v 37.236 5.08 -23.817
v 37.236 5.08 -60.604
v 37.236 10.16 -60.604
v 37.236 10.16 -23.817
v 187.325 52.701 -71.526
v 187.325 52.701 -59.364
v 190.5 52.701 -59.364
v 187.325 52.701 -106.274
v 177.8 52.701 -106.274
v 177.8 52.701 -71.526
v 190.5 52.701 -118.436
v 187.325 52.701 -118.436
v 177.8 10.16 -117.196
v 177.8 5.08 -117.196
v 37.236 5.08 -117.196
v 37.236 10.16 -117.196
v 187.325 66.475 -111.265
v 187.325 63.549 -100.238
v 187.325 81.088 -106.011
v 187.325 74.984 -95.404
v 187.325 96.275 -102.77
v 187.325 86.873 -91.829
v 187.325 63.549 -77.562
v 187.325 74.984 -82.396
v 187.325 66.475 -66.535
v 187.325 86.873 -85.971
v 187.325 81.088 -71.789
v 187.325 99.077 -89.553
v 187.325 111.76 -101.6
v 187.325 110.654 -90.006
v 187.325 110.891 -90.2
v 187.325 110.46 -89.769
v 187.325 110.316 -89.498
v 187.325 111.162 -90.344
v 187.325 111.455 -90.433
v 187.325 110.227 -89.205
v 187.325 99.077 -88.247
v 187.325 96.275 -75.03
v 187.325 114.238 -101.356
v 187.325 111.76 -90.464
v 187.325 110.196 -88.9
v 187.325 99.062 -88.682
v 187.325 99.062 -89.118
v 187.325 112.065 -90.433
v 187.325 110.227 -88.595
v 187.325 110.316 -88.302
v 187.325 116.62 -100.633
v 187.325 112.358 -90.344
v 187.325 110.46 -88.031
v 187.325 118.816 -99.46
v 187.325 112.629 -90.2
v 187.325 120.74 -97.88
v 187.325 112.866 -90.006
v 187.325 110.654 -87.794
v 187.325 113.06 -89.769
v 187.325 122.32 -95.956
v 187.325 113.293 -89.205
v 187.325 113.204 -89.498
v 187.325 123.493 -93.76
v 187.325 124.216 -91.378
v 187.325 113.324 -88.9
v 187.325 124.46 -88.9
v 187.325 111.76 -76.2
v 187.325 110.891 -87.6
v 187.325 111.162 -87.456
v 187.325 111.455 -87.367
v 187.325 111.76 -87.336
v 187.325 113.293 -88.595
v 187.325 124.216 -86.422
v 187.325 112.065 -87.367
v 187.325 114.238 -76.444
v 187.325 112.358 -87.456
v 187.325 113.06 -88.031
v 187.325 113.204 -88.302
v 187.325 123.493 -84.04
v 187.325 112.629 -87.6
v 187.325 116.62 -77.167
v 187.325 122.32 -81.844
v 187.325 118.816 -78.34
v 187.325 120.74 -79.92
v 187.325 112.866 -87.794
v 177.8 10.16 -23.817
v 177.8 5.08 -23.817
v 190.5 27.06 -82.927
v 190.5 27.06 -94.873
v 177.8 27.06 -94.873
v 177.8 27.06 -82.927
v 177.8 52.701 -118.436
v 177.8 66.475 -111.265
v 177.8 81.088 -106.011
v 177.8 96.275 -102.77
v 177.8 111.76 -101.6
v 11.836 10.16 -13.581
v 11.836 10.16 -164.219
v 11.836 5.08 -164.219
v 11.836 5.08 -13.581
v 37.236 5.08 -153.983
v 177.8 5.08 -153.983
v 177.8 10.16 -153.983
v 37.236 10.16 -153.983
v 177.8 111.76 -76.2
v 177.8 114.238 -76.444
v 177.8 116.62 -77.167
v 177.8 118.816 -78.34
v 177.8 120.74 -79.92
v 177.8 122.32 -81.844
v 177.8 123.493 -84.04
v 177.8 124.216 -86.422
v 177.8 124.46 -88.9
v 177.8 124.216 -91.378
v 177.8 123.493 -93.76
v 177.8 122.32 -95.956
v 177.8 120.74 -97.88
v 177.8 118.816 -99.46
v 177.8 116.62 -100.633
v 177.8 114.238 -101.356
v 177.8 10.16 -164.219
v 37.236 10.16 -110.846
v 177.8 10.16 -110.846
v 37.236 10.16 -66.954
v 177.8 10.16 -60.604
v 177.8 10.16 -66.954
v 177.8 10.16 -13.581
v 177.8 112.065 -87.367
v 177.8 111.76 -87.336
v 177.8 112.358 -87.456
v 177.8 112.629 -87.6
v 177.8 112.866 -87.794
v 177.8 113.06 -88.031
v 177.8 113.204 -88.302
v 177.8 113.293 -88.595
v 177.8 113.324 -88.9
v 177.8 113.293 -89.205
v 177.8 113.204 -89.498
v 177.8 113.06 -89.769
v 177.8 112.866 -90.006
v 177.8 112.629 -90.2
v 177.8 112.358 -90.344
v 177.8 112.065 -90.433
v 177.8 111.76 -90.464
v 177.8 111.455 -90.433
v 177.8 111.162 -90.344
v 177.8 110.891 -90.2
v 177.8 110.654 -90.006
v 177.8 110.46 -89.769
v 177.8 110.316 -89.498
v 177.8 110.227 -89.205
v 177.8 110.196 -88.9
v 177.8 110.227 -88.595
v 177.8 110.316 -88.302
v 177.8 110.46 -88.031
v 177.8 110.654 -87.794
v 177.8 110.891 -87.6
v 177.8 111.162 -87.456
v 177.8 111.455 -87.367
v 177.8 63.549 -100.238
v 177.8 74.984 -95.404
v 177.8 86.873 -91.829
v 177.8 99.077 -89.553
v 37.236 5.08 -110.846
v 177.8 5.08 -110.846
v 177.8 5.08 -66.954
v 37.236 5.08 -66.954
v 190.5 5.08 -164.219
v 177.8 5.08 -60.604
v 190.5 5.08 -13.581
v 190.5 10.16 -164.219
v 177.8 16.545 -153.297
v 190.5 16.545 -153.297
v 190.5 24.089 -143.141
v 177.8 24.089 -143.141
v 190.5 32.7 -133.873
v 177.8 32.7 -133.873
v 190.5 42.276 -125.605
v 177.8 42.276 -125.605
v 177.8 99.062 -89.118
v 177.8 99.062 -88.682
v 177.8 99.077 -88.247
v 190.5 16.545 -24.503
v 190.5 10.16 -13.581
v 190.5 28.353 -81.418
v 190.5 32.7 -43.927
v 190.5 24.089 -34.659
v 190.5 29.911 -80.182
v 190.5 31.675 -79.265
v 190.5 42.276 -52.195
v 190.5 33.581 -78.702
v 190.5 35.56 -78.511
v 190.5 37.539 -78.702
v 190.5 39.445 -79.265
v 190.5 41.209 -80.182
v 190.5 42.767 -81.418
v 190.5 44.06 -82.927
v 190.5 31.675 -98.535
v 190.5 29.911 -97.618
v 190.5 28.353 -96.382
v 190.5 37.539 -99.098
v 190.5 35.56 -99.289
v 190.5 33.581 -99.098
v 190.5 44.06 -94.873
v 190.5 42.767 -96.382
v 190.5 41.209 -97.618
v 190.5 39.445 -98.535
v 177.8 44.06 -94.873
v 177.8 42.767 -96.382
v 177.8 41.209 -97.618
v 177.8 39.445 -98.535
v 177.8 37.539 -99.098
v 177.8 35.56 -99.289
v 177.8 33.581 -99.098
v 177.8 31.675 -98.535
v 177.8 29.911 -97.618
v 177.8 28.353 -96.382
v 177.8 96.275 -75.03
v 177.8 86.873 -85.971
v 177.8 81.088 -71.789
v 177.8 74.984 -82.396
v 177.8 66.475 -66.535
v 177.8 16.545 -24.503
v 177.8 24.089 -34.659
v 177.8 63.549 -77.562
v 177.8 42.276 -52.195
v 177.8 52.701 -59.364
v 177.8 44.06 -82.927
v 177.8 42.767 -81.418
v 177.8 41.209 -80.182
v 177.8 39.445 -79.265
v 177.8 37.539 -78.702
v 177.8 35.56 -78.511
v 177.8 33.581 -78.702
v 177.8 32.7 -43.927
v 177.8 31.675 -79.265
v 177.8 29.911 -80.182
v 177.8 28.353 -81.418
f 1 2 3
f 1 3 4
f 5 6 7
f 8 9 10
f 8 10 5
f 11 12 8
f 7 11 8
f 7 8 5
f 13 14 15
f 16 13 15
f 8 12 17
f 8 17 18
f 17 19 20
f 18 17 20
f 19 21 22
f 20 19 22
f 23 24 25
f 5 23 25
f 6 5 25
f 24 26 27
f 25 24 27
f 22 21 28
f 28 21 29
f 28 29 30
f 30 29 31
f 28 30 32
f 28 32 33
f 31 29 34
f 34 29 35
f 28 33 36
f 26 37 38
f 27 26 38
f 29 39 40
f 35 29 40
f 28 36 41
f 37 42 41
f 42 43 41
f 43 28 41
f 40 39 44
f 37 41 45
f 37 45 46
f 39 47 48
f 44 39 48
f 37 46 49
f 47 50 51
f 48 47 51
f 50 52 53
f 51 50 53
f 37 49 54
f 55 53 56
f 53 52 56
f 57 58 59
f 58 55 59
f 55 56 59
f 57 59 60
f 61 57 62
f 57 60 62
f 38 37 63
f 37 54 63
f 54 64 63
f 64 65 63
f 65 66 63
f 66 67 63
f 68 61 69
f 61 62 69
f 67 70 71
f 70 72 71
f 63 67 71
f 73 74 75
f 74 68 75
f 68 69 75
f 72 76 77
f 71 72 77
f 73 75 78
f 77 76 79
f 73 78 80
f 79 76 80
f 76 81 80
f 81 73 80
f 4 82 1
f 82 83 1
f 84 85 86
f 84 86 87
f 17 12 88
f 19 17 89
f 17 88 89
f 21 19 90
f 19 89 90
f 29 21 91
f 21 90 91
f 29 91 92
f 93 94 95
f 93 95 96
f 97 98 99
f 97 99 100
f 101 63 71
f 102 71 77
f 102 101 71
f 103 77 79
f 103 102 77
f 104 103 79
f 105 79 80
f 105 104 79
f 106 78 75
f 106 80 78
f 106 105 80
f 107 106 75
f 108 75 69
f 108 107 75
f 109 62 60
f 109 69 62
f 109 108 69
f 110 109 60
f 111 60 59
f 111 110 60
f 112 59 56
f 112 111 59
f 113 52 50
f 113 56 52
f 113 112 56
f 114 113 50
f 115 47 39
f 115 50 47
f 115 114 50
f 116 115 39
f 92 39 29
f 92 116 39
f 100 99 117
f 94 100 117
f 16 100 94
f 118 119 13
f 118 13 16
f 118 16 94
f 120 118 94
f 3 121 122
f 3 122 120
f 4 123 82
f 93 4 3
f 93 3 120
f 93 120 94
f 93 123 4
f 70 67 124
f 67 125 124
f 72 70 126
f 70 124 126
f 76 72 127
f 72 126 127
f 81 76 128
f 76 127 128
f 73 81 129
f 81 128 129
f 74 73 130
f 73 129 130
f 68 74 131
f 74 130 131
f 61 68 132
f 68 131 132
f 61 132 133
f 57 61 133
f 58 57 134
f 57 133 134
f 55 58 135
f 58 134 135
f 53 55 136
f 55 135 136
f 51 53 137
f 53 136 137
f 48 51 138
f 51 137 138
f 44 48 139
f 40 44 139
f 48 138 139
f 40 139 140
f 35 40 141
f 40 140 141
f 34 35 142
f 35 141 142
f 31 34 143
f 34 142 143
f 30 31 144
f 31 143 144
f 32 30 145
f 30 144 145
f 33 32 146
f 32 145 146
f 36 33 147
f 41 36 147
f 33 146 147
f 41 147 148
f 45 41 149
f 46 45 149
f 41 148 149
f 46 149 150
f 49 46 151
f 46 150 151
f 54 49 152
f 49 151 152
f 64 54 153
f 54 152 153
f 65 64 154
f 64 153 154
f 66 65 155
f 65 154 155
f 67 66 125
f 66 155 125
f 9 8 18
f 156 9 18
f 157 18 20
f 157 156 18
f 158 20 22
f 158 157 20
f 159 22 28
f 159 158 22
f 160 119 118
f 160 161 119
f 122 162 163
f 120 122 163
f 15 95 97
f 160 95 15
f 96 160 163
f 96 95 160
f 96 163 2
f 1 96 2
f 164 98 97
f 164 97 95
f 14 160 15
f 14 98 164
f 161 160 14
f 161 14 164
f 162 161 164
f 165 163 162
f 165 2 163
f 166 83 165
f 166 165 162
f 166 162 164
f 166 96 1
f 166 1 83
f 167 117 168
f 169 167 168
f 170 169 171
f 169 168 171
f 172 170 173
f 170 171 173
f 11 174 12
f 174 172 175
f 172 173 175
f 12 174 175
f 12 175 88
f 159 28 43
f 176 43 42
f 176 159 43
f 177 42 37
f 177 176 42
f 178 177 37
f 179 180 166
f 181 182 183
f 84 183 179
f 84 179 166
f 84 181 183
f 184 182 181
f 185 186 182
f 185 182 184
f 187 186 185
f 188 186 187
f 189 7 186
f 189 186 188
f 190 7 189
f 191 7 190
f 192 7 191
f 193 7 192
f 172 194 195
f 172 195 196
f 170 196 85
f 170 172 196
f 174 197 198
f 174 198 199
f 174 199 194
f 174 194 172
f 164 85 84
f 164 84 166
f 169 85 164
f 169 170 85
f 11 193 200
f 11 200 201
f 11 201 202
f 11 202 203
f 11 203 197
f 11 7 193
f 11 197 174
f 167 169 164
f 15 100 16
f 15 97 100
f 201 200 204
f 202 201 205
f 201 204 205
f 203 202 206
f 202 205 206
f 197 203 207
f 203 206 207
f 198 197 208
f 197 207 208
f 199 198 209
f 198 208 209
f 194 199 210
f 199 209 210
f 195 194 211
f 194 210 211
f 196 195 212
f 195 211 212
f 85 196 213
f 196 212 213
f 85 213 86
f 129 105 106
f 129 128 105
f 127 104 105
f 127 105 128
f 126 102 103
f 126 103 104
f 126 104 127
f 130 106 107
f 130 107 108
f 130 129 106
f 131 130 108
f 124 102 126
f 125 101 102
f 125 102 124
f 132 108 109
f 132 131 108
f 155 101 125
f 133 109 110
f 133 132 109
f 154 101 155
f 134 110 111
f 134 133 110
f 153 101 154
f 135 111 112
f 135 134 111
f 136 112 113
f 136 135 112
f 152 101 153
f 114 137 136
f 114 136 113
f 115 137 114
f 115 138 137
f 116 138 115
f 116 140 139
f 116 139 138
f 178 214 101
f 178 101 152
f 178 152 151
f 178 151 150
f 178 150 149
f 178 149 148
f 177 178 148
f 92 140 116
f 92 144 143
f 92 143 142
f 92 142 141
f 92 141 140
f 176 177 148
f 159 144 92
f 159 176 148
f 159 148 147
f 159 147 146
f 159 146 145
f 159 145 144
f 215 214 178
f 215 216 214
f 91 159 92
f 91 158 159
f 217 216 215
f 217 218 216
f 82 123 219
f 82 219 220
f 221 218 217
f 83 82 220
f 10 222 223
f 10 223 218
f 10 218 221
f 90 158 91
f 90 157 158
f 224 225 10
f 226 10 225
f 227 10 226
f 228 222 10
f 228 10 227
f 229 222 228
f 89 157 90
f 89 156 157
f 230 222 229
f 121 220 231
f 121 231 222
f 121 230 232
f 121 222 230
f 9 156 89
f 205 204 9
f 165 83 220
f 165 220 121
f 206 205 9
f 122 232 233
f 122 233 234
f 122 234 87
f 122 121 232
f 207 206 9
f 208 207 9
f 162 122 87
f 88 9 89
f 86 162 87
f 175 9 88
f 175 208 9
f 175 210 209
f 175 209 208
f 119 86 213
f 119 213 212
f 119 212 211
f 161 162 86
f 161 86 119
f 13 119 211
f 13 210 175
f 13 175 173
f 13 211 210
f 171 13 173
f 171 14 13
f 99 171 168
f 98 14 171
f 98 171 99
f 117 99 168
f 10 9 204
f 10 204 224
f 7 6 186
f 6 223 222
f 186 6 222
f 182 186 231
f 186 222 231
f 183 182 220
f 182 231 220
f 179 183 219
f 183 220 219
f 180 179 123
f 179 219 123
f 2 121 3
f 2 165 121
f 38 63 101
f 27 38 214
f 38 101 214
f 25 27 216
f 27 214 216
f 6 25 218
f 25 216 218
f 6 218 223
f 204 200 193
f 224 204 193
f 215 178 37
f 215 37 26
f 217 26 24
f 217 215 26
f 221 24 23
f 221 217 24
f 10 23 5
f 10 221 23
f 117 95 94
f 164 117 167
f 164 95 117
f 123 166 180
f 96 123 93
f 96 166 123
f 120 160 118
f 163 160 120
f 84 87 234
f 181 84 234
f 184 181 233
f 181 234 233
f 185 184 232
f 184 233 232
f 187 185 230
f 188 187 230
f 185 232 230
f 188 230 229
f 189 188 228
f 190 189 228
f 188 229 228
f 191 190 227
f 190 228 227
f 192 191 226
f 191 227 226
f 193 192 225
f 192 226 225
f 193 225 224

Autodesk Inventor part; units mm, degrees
ref_plane "YZ Plane" through (0, 0, 0) normal (1, 0, 0) x (0, 1, 0)
ref_plane "XZ Plane" through (0, 0, 0) normal (0, 1, 0) x (-1, 0, 0)
sketch "Sketch1" plane through (0, 0, 0) normal (0, 1, 0) x (-1, 0, 0)
  line L0 (0, 0) -> (-203.2, 0)
  line L1 (-203.2, 0) -> (-203.2, -177.8)
  line L2 (-203.2, -177.8) -> (0, -177.8)
  line L3 (0, -177.8) -> (0, 0)
  dimension "d0" = 203.2
  dimension "d1" = 177.8
extrude "Extrusion1" add sketch "Sketch1" along normal blind 10.16
sketch "Sketch2" plane through (0, 10.16, 0) normal (0, 1, 0) x (1, 0, 0)
  line L0 (203.2, 0) -> (203.2, 177.8) projected
  line L1 (203.2, 0) -> (177.8, 0)
  line L2 (177.8, 0) -> (177.8, 177.8)
  line L3 (177.8, 177.8) -> (203.2, 177.8)
  line L4 (203.2, 177.8) -> (203.2, 0)
  point P0 (0, 0)
  dimension "d4" = 25.4
extrude "Extrusion2" add sketch "Sketch2" along normal blind 42.5408
sketch "Sketch3" plane through (177.8, 10.16, -177.8) normal (-1, 0, 0) x (0, 0, 1)
  circle A0 centre (88.9, 25.4) radius 10.3886
  line L0 (81.407, 32.5957) -> (96.393, 32.5957)
  line L1 (81.5172, 18.0912) -> (96.2828, 18.0912)
  line L2 (0, 0) -> (177.8, 0) projected
  line L3 (82.9273, 33.9) -> (94.8727, 33.9)
  line L4 (82.9273, 16.9) -> (94.8727, 16.9)
  point P0 (177.8, -10.16)
  point P1 (88.9, -101.6)
  point P2 (88.8996, -101.6)
  point P3 (100.9466, -114.2832)
  point P4 (102.2534, -114.2832)
  point P5 (114.3004, -101.6)
  point P6 (114.3, -101.6)
  point P7 (159.1068, 0)
  point P8 (88.9, -76.6381)
  point P9 (114.2997, -101.509)
  point P10 (18.6932, 0)
  dimension "d7" = 20.7772
  dimension "d9" = 14.986
  dimension "d45" = 25.4
  dimension "d58" = 8.5
  dimension "d59" = 8.5
extrude "Extrusion3" cut sketch "Sketch3" against normal blind 50.8 contours A0 L1 L0
sketch "Sketch5" plane through (177.8, 10.16, -177.8) normal (-1, 0, 0) x (0, 0, 1)
  line L0 (-12.7, 203.2) -> (190.5, 203.2)
  line L1 (190.5, 203.2) -> (190.5, 0)
  line L2 (-12.7, 0) -> (-12.7, 203.2)
  line L3 (-12.7, 101.6) -> (190.5, 101.6)
  circle A0 centre (88.9, 101.6) radius 1.5635
  circle A1 centre (88.9, 101.6) radius 12.7
  arc A2 (13.581, 0) -> (76.2003, 101.691) centre (-39.021, 102.5166) ccw
  arc A3 (23.8054, 0) -> (88.9, 95.25) centre (-25.9987, 103.9047) ccw
  line L4 (88.9, -246.9942) -> (88.9, 203.2)
  arc A4 (101.5997, 101.691) -> (164.219, 0) centre (216.821, 102.5166) ccw
  arc A5 (88.9, 95.25) -> (153.9946, 0) centre (203.7987, 103.9047) ccw
  line L5 (153.9946, 0) -> (164.219, 0)
  line L6 (13.581, 0) -> (23.8054, 0)
  line L7 (-12.7, 0) -> (190.5, 0)
  line L8 (177.8, 0) -> (0, 0) projected
  line L9 (177.8, 42.5408) -> (0, 42.5408) projected
  line L10 (88.9, 42.5408) -> (88.9, 0)
  line L11 (0, 0) -> (177.8, 0) projected
  line L12 (13.581, 0) -> (-12.7, 0)
  line L13 (164.219, 0) -> (190.5, 0)
  point P0 (177.8, -10.16)
  point P1 (88.9, -101.6)
  point P2 (88.8996, -101.6)
  point P3 (100.9466, -114.2832)
  point P4 (102.2534, -114.2832)
  point P5 (114.3004, -101.6)
  point P6 (114.3, -101.6)
  point P7 (159.1068, 0)
  point P8 (88.9, -21.8971)
  point P9 (114.2997, -101.509)
  point P10 (88.9, 0)
  point P11 (76.2, 101.6)
  point P12 (76.1996, 101.6)
  point P13 (59.3636, 42.5408)
  point P14 (71.5262, 42.5408)
  point P15 (88.2466, 88.9168)
  point P16 (89.5534, 88.9168)
  point P17 (106.2738, 42.5408)
  point P18 (118.4364, 42.5408)
  point P19 (101.6004, 101.6)
  point P20 (101.6, 101.6)
  dimension "d34" = 25.4
  dimension "d31" = 203.2
  dimension "d32" = 203.2
  dimension "d33" = 3.127
  dimension "d35" = 115.2242
  dimension "d36" = 115.2242
  dimension "d37" = 26.281
  dimension "d38" = 6.35
  dimension "d39" = 101.6
  dimension "d40" = 10.2243
extrude "Extrusion4" add sketch "Sketch5" against normal blind 9.525 contours L4 A0 L3 A1 | A1 L3 A0 L4 | L3 A0 L4 A3 A1 | A1 A3 L9 A2 | A3 L4 A1 | A1 A5 L4 A0 L3 | A4 L9 A5 A1 | L4 A5 A1
sketch "Sketch6" plane through (177.8, 10.16, -177.8) normal (-1, 0, 0) x (0, 0, 1)
  arc A0 (13.581, 0) -> (76.2003, 101.691) centre (-39.021, 102.5166) ccw projected
  arc A1 (101.5997, 101.691) -> (164.219, 0) centre (216.821, 102.5166) ccw projected
  line L0 (177.8, 0) -> (177.8, 42.5408) projected
  line L1 (0, 0) -> (177.8, 0) projected
  line L2 (177.8, 42.5408) -> (0, 42.5408) projected
  line L3 (0, 0) -> (0, 42.5408) projected
  arc A2 (13.581, 0) -> (59.3636, 42.5408) centre (-39.021, 102.5166) ccw
  arc A3 (101.6004, 101.6) -> (118.4364, 42.5408) centre (216.821, 102.5166) ccw projected
  arc A4 (118.4364, 42.5408) -> (164.219, 0) centre (216.821, 102.5166) ccw
  line L4 (0, 42.5408) -> (59.3636, 42.5408) projected
  line L5 (59.3636, 42.5408) -> (0, 42.5408)
  line L6 (0, 42.5408) -> (0, 0)
  line L7 (177.8, 0) -> (0, 0) projected
  line L8 (0, 0) -> (13.581, 0)
  line L9 (164.219, 0) -> (177.8, 0)
  line L10 (177.8, 0) -> (177.8, 42.5408)
  line L11 (118.4364, 42.5408) -> (177.8, 42.5408) projected
  line L12 (118.4364, 42.5408) -> (177.8, 42.5408)
  point P0 (177.8, -10.16)
  point P1 (118.4364, 42.5408)
  point P2 (59.3636, 42.5408)
extrude "Extrusion5" cut sketch "Sketch6" against normal blind 50.8 contours L1 L3 L2 A0 | A1 L2 L0 L1
sketch "Sketch7" plane through (0, 0, 0) normal (0, -1, 0) x (1, 0, 0)
  line L0 (203.2, 0) -> (203.2, -177.8) projected
  line L1 (0, 0) -> (203.2, 0)
  line L2 (203.2, 0) -> (203.2, -177.8)
  line L3 (203.2, -177.8) -> (0, -177.8)
  line L4 (0, -177.8) -> (0, 0)
extrude "Extrusion6" cut sketch "Sketch7" against normal blind 5.08
sketch "Sketch8" plane through (0, 10.16, -177.8) normal (-1, 0, 0) x (0, 0, 1)
  line L0 (0, -5.08) -> (0, 0) projected
  line L1 (0, 0) -> (177.8, 0)
  line L2 (177.8, 0) -> (177.8, -5.08)
  line L3 (177.8, -5.08) -> (0, -5.08)
  line L4 (0, -5.08) -> (0, 0)
  point P0 (177.8, -10.16)
extrude "Extrusion7" cut sketch "Sketch8" against normal blind 11.8364
ref_plane "Work Plane1" through (177.8, 10.16, -88.9) normal (0, 0, 1) x (1, 0, 0)
sketch "Sketch9" plane through (0, 5.08, 0) normal (0, -1, 0) x (1, 0, 0)
  line L0 (177.8, -177.8) -> (11.8364, -177.8) projected
  line L1 (203.2, 0) -> (11.8364, 0)
  line L2 (11.8364, 0) -> (11.8364, -177.8)
  line L3 (11.8364, -177.8) -> (203.2, -177.8)
  line L4 (203.2, -177.8) -> (203.2, 0)
  line L5 (177.8, -177.8) -> (203.2, -177.8) projected
  line L6 (180.173, -177.8) -> (180.173, -117.1956)
  line L7 (203.2, -59.3636) -> (203.2, -118.4364) projected
  line L8 (203.2, -117.1956) -> (11.8364, -117.1956)
  line L9 (11.8364, -177.8) -> (11.8364, 0) projected
  line L10 (155.6362, -177.8) -> (155.6362, -164.211)
  line L11 (177.8, -164.219) -> (203.2, -164.219) projected
  line L12 (203.2, -164.219) -> (11.8364, -164.219)
  line L13 (102.4836, -164.219) -> (102.4836, -153.9828)
  line L14 (203.2, 0) -> (203.2, -177.8) projected
  line L15 (203.2, -153.9828) -> (11.8364, -153.9828)
  line L16 (132.8442, -117.1956) -> (132.8442, -110.8456)
  line L17 (203.2, -110.8456) -> (11.8364, -110.8456)
  line L18 (332.5893, -177.8) -> (332.5893, 0)
  line L19 (203.2, -96.2828) -> (203.2, -81.5172) projected
  line L20 (203.2, -88.9) -> (11.8364, -88.9)
  line L21 (203.2, -60.6044) -> (11.8364, -60.6044)
  line L22 (203.2, -13.581) -> (11.8364, -13.581)
  line L23 (203.2, -23.8172) -> (11.8364, -23.8172)
  line L24 (203.2, -66.9544) -> (11.8364, -66.9544)
  line L25 (177.8, 0) -> (177.8, -177.8) projected
  line L26 (177.8, 0) -> (177.8, -177.8)
  line L27 (11.8364, -201.1873) -> (37.2364, -201.1873)
  line L28 (37.2364, -177.8) -> (37.2364, 0)
  line L29 (11.8364, 0) -> (177.8, 0) projected
  point P0 (0, 0)
  point P1 (37.2364, -164.219)
  point P2 (37.2364, -117.1956)
  point P3 (37.2364, -153.9828)
  point P4 (177.8, -153.9828)
  point P5 (177.8, -117.1956)
  point P6 (37.2364, -66.9544)
  point P7 (37.2364, -110.8456)
  point P8 (177.8, -110.8456)
  point P9 (177.8, -66.9544)
  point P10 (37.2364, -23.8172)
  point P11 (37.2364, -60.6044)
  point P12 (177.8, -60.6044)
  point P13 (177.8, -23.8172)
  point P14 (37.2364, 0)
  point P15 (37.2364, -13.581)
  point P16 (177.8, -13.581)
  point P17 (11.8364, -13.581)
  point P18 (11.8364, -164.219)
  point P19 (180.173, -164.219)
  dimension "d51" = 60.6044
  dimension "d52" = 13.589
  dimension "d53" = 10.2362
  dimension "d54" = 6.35
  dimension "d55" = 25.4
extrude "Extrusion8" cut sketch "Sketch9" against normal through all contours L25 L11 L6 L3 | L0 L10 L12 L25 | L0 L28 L12 L10 | L6 L11 L4 L3 | L0 L2 L12 L28 | L15 L28 L8 L25 | L17 L28 L20 L25 | L20 L28 L24 L25 | L21 L28 L23 L25 | L25 L1 L4 L22 | L22 L28 L1 L25 | L22 L2 L1 L28
sketch "Sketch10" plane through (177.8, 111.76, -88.9) normal (-1, 0, 0) x (0, 0, 1)
  arc A0 (7.3828, -83.5088) -> (7.493, -69.0043) centre (0, -76.2) ccw projected
  circle A1 centre (0, -76.2) radius 10.3886
  line L0 (-16.5091, -76.2) -> (-16.5091, -84.7)
  line L1 (-5.9727, -84.7) -> (5.9727, -84.7)
  line L2 (-16.5091, -76.2) -> (-16.5091, -67.7)
  line L3 (-5.9727, -67.7) -> (10.3883, -67.7)
  line L4 (-7.493, -69.0043) -> (7.493, -69.0043) projected
  point P0 (88.9, -111.76)
  point P1 (7.493, -69.0043)
  point P2 (5.9727, -67.7)
  point P3 (7.3828, -83.5088)
  dimension "d62" = 8.5
  dimension "d63" = 8.5
extrude "Extrusion9" cut sketch "Sketch10" against normal through all contours A1 L1 L4 A0 | L4 A1 L3
sketch "Sketch11" plane through (203.2, 52.7008, -59.3636) normal (1, 0, 0) x (0, 0, -1)
  line L0 (-65.6844, 19.5873) -> (128.5678, 19.5873)
  line L1 (128.5678, 19.5873) -> (128.5678, -67.3009)
  line L2 (128.5678, -67.3009) -> (-65.6844, -67.3009)
  line L3 (-65.6844, -67.3009) -> (-65.6844, 19.5873)
  point P0 (-59.3636, -52.7008)
extrude "Extrusion10" cut sketch "Sketch11" against normal blind 12.7
properties part number "base plate main"
